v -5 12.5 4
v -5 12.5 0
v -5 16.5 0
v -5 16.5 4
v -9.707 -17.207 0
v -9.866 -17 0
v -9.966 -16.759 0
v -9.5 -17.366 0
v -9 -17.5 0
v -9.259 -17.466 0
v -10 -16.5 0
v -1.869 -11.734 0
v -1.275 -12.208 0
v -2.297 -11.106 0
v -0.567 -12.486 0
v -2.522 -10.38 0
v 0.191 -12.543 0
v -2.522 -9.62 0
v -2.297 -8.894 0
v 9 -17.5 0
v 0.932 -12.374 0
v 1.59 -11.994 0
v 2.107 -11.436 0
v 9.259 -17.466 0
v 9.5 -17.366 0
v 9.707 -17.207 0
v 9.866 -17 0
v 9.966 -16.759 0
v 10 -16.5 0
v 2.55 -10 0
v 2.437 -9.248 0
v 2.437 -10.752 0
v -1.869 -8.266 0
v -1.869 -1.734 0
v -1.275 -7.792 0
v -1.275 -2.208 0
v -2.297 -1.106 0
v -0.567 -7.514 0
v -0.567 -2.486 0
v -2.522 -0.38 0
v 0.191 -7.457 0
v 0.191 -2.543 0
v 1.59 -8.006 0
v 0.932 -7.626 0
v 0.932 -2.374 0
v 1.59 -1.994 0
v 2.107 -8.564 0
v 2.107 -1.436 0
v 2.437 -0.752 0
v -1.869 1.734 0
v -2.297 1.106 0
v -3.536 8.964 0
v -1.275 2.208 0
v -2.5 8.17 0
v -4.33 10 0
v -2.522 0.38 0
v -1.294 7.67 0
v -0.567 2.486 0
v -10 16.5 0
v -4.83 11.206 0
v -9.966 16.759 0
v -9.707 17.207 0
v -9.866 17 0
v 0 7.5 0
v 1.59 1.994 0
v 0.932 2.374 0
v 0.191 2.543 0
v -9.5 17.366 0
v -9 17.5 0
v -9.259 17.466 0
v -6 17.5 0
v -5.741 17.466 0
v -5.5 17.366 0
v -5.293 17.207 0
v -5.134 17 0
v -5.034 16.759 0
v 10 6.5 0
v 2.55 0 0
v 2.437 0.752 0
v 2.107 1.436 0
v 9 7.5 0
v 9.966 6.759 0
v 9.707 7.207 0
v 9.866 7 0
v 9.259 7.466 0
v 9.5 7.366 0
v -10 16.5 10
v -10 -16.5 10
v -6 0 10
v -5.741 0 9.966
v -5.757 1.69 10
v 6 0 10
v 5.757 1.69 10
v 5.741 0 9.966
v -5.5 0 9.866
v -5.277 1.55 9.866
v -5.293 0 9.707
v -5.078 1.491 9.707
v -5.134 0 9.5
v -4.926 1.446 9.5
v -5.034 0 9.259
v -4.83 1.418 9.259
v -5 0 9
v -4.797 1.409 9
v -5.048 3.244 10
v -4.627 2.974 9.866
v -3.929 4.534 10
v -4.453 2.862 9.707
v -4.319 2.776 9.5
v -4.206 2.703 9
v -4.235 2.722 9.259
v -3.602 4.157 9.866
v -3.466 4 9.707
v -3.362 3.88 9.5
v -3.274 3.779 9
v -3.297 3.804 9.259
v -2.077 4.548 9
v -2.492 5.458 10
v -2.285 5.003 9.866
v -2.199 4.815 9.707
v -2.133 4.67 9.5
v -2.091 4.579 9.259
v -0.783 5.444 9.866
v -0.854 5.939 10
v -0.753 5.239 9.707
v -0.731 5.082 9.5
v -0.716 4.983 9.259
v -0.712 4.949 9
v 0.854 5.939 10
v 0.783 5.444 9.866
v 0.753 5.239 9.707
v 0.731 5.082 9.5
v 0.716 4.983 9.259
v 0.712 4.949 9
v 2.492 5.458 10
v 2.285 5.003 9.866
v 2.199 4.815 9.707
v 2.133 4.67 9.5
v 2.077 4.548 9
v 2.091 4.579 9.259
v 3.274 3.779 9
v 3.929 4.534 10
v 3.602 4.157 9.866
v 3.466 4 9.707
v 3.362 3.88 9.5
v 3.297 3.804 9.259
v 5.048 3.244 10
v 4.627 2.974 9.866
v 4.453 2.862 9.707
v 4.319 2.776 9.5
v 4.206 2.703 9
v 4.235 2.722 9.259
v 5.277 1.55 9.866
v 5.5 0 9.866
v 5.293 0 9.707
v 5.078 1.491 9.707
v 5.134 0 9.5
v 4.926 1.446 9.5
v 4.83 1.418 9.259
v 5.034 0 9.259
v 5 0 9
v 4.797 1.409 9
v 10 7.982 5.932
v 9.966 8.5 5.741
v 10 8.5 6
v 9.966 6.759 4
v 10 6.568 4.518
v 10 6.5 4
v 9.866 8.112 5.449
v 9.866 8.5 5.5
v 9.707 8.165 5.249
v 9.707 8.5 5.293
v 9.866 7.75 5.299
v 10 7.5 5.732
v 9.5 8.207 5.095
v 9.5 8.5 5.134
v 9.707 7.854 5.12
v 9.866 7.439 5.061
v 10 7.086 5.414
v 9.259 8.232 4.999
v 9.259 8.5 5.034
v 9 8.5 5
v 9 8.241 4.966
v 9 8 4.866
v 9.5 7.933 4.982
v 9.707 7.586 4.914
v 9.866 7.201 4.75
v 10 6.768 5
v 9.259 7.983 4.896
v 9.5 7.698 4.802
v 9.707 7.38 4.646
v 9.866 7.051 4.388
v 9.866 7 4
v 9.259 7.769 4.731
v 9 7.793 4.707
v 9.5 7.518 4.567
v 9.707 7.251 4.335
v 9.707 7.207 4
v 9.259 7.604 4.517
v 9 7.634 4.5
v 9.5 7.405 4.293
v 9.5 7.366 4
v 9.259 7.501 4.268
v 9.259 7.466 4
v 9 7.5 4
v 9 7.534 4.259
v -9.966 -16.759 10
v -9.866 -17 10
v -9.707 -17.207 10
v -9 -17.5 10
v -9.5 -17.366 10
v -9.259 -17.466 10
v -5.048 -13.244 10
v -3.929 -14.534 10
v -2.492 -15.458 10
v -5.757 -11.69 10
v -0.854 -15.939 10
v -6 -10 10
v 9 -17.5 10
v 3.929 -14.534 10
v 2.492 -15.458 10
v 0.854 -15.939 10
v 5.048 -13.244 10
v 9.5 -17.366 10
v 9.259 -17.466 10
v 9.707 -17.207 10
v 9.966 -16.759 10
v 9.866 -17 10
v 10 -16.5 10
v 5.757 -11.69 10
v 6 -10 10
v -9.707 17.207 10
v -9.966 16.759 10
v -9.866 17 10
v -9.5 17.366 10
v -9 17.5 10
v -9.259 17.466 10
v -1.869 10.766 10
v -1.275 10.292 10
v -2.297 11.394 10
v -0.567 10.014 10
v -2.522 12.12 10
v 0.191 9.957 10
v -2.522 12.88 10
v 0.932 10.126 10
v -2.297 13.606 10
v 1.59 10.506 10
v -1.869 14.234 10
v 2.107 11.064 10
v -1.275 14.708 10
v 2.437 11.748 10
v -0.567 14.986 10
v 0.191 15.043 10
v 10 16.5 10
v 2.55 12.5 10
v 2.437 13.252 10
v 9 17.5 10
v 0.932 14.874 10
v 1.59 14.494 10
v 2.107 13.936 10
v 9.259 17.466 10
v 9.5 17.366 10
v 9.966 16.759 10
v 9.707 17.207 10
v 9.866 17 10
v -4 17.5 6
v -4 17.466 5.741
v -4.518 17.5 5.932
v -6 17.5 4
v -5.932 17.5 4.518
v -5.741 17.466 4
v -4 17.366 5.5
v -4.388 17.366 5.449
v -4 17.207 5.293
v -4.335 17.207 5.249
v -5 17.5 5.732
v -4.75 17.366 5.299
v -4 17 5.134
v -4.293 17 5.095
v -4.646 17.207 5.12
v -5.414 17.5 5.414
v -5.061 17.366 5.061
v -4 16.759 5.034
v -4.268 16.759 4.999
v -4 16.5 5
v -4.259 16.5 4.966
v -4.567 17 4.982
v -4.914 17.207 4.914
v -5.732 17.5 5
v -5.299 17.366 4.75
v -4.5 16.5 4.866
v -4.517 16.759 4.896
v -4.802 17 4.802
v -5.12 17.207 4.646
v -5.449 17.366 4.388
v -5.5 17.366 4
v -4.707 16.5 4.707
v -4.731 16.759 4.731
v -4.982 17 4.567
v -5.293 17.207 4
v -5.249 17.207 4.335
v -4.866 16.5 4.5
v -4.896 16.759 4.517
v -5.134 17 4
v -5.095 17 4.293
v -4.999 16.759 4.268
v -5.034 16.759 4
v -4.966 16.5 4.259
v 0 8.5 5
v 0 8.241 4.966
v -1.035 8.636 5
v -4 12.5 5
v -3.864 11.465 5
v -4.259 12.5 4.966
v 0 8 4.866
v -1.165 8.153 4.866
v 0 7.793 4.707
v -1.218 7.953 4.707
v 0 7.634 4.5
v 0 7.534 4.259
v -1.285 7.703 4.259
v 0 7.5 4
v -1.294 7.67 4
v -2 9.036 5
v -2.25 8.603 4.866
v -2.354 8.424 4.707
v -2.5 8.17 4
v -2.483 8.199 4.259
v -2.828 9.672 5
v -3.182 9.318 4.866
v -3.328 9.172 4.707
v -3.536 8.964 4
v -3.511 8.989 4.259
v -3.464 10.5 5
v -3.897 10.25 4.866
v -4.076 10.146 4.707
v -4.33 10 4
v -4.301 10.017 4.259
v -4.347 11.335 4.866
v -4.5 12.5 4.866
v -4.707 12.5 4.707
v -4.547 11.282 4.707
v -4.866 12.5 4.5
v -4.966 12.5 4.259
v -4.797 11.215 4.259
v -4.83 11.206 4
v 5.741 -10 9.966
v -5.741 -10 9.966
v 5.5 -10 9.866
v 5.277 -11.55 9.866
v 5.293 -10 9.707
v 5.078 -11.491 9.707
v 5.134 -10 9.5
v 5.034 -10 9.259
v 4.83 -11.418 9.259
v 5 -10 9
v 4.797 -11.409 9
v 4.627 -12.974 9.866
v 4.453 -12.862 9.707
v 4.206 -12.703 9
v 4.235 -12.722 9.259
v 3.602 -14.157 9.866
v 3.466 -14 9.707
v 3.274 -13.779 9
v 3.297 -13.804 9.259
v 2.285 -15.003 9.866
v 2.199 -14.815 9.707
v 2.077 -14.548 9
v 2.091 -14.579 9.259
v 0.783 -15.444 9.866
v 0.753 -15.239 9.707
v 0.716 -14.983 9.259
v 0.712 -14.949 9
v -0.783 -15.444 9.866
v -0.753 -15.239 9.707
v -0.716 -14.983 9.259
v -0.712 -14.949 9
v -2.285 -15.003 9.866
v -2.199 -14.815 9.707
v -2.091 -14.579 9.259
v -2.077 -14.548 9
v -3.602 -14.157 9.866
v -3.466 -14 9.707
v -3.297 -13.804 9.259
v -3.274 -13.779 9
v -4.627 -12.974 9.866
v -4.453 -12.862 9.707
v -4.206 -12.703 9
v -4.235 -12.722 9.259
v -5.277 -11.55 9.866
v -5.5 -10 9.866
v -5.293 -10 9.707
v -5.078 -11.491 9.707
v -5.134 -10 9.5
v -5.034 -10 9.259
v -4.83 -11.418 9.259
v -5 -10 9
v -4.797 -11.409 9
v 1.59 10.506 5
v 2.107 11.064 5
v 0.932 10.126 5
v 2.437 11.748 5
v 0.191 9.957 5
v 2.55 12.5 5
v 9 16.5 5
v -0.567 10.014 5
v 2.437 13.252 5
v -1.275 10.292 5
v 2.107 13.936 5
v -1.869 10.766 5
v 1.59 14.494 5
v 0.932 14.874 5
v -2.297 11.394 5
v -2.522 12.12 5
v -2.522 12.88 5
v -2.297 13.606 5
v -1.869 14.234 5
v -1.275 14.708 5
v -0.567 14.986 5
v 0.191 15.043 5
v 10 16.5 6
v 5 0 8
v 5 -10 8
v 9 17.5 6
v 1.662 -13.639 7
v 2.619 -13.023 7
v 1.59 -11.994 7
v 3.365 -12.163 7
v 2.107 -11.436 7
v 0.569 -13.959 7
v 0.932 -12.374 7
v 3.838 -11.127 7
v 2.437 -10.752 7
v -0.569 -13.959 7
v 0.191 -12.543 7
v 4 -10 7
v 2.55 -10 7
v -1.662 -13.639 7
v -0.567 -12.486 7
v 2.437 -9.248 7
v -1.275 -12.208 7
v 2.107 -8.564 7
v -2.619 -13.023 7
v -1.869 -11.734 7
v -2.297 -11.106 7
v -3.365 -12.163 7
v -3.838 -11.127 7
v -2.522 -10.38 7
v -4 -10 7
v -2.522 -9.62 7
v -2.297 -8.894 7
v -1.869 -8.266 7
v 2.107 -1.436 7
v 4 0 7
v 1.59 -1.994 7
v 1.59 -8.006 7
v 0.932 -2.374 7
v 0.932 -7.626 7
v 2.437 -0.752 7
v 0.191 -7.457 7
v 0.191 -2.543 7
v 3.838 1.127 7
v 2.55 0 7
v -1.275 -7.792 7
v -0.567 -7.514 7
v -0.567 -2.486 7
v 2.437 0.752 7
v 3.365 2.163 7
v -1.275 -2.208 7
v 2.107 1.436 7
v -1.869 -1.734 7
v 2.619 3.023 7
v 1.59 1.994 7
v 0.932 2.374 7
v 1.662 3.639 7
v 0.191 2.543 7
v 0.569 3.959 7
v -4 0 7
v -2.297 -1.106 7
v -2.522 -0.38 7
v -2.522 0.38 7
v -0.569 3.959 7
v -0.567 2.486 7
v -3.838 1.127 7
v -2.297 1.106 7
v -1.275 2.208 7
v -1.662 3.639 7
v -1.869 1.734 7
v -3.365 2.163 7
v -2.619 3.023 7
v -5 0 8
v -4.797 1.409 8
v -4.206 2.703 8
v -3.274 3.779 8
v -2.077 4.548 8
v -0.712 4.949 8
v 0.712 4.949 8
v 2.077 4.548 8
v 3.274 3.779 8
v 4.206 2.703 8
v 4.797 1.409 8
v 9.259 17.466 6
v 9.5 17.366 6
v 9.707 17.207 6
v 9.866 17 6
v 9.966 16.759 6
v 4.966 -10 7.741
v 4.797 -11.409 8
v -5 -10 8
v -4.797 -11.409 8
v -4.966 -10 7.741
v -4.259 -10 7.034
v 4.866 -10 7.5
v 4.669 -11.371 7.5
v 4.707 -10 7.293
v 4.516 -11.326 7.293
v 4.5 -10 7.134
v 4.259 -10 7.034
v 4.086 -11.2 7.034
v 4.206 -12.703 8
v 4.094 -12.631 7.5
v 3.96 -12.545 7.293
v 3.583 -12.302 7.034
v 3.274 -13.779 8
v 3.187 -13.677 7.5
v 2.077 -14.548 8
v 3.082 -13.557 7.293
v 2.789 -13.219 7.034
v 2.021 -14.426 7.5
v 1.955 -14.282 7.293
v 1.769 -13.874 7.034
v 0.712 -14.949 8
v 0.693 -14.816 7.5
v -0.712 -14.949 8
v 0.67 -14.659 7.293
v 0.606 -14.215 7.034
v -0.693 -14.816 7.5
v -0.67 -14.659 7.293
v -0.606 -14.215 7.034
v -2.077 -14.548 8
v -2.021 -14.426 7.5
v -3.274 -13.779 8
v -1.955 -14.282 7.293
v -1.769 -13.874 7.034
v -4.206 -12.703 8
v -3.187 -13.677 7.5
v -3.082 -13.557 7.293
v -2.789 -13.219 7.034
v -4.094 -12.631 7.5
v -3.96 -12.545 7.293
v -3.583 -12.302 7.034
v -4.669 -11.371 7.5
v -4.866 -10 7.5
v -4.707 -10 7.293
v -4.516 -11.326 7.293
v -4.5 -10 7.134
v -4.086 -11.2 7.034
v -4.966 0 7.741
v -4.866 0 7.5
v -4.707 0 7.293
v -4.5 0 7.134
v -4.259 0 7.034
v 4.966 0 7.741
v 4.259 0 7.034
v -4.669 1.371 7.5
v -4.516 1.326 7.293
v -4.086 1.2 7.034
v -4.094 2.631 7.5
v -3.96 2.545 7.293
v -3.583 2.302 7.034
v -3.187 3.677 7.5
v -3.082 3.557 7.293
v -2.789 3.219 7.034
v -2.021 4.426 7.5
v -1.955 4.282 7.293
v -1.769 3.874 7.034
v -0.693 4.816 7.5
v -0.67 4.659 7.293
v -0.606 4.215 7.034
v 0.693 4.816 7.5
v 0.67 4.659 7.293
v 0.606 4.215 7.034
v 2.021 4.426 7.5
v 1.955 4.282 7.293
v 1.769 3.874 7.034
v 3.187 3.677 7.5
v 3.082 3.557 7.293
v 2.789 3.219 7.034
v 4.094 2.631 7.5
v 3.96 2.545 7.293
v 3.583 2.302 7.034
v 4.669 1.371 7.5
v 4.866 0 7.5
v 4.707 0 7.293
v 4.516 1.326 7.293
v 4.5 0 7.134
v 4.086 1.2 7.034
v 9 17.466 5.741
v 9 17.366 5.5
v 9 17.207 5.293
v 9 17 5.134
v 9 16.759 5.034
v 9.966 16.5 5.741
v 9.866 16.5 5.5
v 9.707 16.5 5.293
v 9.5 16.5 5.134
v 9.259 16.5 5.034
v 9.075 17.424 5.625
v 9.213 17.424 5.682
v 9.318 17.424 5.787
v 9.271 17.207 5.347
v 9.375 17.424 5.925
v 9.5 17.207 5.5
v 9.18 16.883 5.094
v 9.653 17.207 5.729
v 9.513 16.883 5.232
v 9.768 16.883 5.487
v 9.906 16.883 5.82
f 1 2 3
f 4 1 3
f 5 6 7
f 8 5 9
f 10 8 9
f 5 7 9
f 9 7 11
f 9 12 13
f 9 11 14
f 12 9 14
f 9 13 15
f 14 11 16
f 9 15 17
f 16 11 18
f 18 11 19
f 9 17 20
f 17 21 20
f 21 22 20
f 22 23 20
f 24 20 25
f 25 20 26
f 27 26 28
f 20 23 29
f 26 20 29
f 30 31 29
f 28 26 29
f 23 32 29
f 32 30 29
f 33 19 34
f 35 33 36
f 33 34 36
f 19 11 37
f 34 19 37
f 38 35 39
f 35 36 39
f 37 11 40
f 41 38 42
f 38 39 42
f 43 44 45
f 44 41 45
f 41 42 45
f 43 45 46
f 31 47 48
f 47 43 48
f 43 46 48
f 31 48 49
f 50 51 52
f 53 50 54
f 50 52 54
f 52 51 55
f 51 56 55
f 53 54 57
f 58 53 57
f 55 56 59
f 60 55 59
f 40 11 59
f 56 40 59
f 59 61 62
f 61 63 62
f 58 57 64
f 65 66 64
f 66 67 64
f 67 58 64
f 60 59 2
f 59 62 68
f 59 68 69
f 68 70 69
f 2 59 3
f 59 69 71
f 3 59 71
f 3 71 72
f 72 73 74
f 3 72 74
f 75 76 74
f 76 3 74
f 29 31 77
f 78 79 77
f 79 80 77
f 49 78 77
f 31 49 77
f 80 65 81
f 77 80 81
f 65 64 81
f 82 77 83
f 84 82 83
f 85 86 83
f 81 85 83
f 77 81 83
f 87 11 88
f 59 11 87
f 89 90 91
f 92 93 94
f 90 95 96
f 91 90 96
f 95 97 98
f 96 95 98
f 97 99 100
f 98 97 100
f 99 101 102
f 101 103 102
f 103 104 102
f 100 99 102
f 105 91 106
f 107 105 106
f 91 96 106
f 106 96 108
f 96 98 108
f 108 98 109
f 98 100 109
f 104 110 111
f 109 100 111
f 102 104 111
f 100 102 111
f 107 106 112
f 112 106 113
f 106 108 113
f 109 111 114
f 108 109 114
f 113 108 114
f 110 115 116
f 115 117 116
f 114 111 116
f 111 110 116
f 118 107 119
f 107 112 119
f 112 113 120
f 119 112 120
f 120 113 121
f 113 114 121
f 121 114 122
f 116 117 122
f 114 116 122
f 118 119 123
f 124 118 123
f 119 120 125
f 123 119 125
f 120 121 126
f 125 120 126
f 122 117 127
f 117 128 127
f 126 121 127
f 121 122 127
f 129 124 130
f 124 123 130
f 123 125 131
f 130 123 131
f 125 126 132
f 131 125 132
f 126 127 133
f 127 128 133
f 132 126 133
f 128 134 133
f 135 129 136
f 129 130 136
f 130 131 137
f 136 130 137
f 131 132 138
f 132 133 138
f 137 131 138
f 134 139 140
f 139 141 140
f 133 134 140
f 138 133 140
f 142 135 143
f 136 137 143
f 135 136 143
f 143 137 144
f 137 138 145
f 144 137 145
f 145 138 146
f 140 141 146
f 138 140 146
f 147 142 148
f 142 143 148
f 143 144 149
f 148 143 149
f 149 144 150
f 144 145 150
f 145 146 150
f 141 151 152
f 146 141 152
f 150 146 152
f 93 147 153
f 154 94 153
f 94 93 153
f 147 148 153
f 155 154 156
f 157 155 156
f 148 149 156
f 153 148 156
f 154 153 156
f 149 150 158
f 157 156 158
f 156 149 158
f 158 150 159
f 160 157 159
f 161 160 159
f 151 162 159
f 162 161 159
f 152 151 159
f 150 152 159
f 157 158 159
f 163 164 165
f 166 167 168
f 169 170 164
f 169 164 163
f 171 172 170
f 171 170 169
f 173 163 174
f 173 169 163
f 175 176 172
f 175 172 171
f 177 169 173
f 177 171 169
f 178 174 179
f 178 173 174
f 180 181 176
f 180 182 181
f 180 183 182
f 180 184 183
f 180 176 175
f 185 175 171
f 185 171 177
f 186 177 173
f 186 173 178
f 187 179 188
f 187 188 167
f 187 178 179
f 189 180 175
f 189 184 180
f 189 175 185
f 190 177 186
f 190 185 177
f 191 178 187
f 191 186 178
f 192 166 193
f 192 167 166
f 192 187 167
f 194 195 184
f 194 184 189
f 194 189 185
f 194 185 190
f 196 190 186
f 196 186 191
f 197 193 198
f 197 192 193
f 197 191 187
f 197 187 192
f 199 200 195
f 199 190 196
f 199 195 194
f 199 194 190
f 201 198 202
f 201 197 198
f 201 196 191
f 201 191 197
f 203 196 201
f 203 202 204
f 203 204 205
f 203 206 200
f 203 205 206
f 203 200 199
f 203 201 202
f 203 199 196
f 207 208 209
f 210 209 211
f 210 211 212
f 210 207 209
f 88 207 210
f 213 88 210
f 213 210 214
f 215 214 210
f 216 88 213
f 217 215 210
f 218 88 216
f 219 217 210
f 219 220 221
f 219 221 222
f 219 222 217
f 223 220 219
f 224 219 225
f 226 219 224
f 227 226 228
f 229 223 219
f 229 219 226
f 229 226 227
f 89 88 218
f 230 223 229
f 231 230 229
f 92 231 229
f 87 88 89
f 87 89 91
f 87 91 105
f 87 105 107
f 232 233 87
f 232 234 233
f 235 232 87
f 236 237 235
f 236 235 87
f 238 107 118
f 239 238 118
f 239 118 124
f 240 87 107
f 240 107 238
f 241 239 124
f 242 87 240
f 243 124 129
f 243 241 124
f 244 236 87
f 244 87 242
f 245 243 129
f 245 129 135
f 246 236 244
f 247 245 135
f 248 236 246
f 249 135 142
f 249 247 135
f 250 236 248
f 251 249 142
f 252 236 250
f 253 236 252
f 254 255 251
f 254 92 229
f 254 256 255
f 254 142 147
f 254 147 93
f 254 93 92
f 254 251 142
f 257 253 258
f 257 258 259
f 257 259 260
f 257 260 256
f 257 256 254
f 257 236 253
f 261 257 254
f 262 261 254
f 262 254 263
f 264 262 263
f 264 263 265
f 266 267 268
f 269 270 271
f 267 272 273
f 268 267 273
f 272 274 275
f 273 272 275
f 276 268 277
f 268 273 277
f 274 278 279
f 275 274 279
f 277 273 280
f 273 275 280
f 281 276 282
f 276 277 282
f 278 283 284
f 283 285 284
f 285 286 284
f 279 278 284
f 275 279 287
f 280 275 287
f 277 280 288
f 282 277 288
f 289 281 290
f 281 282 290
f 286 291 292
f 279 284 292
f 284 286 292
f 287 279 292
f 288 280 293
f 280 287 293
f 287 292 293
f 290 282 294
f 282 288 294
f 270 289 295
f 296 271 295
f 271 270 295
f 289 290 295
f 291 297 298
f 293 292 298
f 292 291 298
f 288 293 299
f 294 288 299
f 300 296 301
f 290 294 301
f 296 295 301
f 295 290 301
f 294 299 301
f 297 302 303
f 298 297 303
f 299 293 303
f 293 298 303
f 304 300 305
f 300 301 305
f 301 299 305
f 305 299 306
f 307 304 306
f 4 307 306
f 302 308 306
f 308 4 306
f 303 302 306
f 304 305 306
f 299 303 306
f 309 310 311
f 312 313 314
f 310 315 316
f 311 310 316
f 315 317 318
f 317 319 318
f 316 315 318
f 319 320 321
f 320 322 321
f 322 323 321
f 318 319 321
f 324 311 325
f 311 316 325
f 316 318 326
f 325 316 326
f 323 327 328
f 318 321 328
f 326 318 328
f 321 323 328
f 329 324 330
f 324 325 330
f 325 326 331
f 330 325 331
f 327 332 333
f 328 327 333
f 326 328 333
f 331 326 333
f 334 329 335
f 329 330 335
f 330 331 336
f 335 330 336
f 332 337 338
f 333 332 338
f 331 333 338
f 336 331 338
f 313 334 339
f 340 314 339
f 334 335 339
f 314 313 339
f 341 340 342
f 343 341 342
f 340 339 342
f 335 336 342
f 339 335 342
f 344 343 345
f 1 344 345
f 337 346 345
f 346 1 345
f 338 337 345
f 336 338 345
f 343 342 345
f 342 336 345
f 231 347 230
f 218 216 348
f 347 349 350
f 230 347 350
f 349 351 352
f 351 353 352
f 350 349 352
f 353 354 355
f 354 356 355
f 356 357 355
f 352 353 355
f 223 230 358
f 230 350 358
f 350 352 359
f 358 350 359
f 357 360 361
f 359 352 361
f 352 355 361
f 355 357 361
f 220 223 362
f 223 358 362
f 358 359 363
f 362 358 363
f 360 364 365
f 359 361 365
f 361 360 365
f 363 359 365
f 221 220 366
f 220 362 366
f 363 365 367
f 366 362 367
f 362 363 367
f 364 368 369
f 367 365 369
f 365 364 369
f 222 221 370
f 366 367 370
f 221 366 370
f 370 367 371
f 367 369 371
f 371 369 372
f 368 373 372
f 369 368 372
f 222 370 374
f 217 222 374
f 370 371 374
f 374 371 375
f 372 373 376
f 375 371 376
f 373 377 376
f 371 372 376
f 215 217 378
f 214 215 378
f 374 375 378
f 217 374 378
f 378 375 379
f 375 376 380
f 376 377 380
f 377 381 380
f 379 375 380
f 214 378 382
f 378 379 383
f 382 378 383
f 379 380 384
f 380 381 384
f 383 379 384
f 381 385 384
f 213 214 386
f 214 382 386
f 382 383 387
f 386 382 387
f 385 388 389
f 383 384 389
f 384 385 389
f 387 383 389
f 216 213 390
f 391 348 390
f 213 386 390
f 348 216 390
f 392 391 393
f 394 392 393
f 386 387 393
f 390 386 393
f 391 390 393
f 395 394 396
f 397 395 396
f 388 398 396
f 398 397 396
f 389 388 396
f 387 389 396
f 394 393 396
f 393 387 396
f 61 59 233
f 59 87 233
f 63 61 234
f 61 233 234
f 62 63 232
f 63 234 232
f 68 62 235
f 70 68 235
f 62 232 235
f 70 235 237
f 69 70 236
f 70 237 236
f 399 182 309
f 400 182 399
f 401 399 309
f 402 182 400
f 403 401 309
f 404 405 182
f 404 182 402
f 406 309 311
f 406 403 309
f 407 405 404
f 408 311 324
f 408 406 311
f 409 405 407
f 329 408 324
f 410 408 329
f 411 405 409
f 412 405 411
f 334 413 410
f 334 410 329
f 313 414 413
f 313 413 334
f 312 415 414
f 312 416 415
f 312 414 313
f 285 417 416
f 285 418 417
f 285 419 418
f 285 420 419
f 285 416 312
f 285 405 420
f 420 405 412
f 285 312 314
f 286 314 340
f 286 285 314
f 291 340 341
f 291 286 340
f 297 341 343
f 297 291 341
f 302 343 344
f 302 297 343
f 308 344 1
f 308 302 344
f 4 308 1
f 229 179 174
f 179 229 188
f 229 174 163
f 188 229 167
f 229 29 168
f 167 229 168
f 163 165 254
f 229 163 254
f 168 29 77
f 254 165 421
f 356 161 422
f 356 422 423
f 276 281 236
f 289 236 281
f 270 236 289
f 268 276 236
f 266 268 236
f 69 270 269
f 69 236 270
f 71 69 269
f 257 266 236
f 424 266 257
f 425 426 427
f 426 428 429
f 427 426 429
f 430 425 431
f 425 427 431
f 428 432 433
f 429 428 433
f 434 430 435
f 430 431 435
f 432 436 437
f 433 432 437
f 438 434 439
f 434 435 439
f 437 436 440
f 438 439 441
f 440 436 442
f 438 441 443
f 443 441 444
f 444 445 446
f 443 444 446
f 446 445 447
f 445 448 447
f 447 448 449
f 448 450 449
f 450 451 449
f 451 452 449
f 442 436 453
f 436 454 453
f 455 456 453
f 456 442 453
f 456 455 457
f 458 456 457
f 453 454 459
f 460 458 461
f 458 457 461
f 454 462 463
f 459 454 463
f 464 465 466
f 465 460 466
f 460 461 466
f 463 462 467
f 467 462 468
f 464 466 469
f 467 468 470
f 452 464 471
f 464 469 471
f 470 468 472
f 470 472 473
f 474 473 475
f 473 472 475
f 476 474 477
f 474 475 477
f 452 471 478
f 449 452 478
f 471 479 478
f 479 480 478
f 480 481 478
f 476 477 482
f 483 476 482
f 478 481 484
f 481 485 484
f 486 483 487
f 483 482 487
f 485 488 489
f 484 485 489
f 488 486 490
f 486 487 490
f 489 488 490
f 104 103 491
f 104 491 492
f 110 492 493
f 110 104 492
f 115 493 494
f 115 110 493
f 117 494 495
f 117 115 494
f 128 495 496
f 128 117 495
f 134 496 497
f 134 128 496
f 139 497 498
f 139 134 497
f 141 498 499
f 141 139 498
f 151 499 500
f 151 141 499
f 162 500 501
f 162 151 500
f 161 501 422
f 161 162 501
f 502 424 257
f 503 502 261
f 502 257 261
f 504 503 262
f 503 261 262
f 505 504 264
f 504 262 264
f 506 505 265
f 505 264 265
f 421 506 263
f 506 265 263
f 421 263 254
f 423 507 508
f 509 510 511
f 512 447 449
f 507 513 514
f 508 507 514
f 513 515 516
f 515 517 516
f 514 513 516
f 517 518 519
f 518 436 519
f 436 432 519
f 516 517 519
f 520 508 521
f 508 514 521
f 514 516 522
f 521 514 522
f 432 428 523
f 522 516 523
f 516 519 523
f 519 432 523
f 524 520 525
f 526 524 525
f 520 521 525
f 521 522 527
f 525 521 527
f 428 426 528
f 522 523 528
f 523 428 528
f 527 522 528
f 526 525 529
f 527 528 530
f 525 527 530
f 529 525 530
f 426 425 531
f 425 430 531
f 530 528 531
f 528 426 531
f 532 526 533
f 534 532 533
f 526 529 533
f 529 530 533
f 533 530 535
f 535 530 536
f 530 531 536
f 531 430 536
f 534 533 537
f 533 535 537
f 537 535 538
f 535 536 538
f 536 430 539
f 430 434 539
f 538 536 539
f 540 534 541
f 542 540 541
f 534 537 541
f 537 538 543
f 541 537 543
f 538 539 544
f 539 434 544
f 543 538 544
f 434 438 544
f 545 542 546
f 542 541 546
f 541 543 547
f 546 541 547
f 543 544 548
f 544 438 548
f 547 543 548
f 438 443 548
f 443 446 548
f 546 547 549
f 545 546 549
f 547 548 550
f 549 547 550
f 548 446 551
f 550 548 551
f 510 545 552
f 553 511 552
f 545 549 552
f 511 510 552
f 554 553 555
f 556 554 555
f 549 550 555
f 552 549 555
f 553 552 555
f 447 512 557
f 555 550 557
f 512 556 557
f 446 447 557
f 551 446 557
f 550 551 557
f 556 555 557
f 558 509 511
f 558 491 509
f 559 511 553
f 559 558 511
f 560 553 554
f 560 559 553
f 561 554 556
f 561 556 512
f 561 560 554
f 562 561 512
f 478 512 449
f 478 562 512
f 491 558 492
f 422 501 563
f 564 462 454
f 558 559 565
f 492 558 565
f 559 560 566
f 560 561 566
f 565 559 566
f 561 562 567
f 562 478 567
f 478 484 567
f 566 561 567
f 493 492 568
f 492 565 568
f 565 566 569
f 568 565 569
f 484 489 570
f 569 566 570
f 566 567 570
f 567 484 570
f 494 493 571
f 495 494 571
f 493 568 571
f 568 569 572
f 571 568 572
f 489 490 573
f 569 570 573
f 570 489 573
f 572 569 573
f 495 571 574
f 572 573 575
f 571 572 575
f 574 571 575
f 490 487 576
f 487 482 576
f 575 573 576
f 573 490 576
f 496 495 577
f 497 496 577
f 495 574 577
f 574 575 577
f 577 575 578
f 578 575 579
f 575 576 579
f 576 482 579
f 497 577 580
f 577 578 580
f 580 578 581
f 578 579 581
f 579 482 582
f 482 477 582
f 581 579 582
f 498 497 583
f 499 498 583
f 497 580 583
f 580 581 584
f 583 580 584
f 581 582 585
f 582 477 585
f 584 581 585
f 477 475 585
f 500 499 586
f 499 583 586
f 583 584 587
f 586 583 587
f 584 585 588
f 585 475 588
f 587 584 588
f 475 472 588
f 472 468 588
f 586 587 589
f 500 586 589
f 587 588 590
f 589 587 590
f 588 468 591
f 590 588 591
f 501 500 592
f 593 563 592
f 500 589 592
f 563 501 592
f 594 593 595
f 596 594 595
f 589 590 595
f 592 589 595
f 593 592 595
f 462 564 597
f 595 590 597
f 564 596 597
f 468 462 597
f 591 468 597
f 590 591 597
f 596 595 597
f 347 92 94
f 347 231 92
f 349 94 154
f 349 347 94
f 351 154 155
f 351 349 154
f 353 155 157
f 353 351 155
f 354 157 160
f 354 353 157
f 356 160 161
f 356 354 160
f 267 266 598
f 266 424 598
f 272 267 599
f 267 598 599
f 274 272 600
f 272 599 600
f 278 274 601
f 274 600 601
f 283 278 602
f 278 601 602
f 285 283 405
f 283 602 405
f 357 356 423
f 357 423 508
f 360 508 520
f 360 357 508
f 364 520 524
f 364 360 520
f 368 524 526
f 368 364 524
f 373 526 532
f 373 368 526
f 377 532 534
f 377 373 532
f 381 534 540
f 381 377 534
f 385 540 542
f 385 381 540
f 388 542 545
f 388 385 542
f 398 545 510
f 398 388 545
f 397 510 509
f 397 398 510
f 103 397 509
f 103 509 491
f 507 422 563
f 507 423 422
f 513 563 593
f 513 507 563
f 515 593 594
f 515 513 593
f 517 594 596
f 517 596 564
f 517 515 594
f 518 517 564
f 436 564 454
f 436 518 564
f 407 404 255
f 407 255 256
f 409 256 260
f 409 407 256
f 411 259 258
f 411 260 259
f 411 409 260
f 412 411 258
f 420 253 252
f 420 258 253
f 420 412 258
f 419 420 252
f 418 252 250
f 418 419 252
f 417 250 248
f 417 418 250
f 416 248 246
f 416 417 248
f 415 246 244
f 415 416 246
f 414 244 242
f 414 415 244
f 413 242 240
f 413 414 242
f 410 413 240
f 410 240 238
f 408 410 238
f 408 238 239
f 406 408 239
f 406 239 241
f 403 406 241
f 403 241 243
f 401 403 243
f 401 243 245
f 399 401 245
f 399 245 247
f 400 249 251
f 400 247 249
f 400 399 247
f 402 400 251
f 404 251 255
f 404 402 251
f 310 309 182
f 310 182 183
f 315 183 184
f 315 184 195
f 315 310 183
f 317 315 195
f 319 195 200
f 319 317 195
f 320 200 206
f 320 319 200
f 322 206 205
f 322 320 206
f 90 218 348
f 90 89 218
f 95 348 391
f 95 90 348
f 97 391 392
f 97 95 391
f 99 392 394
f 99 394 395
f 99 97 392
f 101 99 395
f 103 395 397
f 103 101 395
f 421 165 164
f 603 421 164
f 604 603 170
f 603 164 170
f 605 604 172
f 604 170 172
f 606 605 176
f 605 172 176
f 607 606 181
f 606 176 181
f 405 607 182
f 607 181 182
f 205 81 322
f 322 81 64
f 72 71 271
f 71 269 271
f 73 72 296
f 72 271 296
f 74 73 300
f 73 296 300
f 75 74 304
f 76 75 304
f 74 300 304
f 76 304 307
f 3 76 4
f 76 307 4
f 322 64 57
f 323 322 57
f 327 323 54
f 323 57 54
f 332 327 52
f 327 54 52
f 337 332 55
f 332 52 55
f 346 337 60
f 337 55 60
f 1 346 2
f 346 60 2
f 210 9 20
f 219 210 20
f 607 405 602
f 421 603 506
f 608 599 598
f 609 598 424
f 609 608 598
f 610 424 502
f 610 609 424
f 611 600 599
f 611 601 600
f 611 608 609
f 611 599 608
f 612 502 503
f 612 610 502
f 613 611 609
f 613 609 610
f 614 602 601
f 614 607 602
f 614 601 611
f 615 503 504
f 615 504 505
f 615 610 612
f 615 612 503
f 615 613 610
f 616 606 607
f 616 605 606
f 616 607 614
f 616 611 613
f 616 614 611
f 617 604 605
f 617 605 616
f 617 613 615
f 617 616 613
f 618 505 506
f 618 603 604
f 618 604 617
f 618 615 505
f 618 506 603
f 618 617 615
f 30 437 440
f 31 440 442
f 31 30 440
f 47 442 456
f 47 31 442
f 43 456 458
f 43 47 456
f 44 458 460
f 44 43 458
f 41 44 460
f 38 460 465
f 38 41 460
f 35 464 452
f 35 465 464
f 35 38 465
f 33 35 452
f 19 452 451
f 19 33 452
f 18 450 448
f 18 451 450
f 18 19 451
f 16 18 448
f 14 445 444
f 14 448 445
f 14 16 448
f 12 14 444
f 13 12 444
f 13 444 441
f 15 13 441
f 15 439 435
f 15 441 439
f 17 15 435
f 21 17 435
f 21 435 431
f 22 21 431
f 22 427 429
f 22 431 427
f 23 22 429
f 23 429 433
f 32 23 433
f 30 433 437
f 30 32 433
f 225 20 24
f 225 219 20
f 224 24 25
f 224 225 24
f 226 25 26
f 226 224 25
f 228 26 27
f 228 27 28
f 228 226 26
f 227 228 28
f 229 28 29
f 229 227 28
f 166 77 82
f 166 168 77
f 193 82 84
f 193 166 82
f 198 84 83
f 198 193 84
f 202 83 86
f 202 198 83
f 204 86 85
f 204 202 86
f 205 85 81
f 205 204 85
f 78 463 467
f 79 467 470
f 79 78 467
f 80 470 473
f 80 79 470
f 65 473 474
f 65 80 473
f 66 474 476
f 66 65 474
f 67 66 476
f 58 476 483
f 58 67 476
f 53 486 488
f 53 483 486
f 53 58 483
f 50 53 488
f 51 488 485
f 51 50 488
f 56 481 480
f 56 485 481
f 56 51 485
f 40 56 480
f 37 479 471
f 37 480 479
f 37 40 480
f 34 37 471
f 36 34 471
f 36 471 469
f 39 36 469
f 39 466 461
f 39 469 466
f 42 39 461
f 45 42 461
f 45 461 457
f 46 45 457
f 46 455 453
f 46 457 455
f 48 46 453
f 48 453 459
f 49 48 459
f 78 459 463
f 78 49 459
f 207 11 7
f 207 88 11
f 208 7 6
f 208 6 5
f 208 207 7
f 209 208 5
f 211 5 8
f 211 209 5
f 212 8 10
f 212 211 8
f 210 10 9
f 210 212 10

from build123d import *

# Parameters (mm, degrees)
SKETCH1_W           = 20
SKETCH1_H           = 35
SKETCH1_R           = 2.55
BOSS_EXTRUDE1_DEPTH = 10
CUT_EXTRUDE1_DEPTH  = 5
SKETCH3_R           = 2.55
CUT_EXTRUDE2_DEPTH  = 23.5
CUT_EXTRUDE4_START  = 10
CUT_EXTRUDE4_DEPTH  = 3
FILLET1_R           = 1


with BuildPart() as part:
    # Sketch1 → Boss-Extrude1 (new body)
    with BuildSketch(Plane.XY):
        Rectangle(SKETCH1_W, SKETCH1_H)
        with Locations((0, -10)):
            Circle(SKETCH1_R, mode=Mode.SUBTRACT)
        Circle(SKETCH1_R, mode=Mode.SUBTRACT)
    extrude(amount=BOSS_EXTRUDE1_DEPTH)

    # Sketch2 → Cut-Extrude1 (cut)
    with BuildSketch(Plane.XY):
        with BuildLine():
            Line((-5, 12.5), (-5, 17.5))
            Line((-5, 17.5), (10, 17.5))
            Line((10, 17.5), (10, 7.5))
            Line((10, 7.5), (0, 7.5))
            ThreePointArc((0, 7.5), (-3.535533906, 8.964466094), (-5, 12.5))
        make_face()
    extrude(amount=CUT_EXTRUDE1_DEPTH, mode=Mode.SUBTRACT)

    # Sketch3 → Cut-Extrude2 (cut, through all)
    with BuildSketch(Plane.XY):
        with Locations((0, 12.5)):
            Circle(SKETCH3_R)
    extrude(amount=CUT_EXTRUDE2_DEPTH, mode=Mode.SUBTRACT)

    # Sketch4 → Cut-Extrude4 (cut)
    with BuildSketch(Plane.XY.offset(CUT_EXTRUDE4_START)):
        with BuildLine():
            Line((-5, -10), (-5, 0))
            ThreePointArc((-5, 0), (0, 5), (5, 0))
            Line((5, 0), (5, -10))
            ThreePointArc((5, -10), (0, -15), (-5, -10))
        make_face()
    extrude(amount=-CUT_EXTRUDE4_DEPTH, mode=Mode.SUBTRACT)

    # Fillet1
    fillet1_edges = [part.edges().sort_by_distance(p)[0] for p in [
        (10, 7.5, 2.5),
        (-5, 17.5, 2.5),
        (-3.535533906, 8.964466094, 5),
        (5, 7.5, 5),
        (10, 12.5, 5),
        (2.5, 17.5, 5),
        (-5, 15, 5),
        (-5, -5, 10),
        (0, 5, 7),
        (5, -5, 10),
        (0, -15, 7),
        (-5, -5, 7),
        (5, -5, 7),
        (0, -15, 10),
        (0, 5, 10),
        (10, 17.5, 7.5),
        (10, -17.5, 5),
        (-10, -17.5, 5),
        (-10, 17.5, 5),
    ]]
    fillet(fillet1_edges, radius=FILLET1_R)


solid = part.part
